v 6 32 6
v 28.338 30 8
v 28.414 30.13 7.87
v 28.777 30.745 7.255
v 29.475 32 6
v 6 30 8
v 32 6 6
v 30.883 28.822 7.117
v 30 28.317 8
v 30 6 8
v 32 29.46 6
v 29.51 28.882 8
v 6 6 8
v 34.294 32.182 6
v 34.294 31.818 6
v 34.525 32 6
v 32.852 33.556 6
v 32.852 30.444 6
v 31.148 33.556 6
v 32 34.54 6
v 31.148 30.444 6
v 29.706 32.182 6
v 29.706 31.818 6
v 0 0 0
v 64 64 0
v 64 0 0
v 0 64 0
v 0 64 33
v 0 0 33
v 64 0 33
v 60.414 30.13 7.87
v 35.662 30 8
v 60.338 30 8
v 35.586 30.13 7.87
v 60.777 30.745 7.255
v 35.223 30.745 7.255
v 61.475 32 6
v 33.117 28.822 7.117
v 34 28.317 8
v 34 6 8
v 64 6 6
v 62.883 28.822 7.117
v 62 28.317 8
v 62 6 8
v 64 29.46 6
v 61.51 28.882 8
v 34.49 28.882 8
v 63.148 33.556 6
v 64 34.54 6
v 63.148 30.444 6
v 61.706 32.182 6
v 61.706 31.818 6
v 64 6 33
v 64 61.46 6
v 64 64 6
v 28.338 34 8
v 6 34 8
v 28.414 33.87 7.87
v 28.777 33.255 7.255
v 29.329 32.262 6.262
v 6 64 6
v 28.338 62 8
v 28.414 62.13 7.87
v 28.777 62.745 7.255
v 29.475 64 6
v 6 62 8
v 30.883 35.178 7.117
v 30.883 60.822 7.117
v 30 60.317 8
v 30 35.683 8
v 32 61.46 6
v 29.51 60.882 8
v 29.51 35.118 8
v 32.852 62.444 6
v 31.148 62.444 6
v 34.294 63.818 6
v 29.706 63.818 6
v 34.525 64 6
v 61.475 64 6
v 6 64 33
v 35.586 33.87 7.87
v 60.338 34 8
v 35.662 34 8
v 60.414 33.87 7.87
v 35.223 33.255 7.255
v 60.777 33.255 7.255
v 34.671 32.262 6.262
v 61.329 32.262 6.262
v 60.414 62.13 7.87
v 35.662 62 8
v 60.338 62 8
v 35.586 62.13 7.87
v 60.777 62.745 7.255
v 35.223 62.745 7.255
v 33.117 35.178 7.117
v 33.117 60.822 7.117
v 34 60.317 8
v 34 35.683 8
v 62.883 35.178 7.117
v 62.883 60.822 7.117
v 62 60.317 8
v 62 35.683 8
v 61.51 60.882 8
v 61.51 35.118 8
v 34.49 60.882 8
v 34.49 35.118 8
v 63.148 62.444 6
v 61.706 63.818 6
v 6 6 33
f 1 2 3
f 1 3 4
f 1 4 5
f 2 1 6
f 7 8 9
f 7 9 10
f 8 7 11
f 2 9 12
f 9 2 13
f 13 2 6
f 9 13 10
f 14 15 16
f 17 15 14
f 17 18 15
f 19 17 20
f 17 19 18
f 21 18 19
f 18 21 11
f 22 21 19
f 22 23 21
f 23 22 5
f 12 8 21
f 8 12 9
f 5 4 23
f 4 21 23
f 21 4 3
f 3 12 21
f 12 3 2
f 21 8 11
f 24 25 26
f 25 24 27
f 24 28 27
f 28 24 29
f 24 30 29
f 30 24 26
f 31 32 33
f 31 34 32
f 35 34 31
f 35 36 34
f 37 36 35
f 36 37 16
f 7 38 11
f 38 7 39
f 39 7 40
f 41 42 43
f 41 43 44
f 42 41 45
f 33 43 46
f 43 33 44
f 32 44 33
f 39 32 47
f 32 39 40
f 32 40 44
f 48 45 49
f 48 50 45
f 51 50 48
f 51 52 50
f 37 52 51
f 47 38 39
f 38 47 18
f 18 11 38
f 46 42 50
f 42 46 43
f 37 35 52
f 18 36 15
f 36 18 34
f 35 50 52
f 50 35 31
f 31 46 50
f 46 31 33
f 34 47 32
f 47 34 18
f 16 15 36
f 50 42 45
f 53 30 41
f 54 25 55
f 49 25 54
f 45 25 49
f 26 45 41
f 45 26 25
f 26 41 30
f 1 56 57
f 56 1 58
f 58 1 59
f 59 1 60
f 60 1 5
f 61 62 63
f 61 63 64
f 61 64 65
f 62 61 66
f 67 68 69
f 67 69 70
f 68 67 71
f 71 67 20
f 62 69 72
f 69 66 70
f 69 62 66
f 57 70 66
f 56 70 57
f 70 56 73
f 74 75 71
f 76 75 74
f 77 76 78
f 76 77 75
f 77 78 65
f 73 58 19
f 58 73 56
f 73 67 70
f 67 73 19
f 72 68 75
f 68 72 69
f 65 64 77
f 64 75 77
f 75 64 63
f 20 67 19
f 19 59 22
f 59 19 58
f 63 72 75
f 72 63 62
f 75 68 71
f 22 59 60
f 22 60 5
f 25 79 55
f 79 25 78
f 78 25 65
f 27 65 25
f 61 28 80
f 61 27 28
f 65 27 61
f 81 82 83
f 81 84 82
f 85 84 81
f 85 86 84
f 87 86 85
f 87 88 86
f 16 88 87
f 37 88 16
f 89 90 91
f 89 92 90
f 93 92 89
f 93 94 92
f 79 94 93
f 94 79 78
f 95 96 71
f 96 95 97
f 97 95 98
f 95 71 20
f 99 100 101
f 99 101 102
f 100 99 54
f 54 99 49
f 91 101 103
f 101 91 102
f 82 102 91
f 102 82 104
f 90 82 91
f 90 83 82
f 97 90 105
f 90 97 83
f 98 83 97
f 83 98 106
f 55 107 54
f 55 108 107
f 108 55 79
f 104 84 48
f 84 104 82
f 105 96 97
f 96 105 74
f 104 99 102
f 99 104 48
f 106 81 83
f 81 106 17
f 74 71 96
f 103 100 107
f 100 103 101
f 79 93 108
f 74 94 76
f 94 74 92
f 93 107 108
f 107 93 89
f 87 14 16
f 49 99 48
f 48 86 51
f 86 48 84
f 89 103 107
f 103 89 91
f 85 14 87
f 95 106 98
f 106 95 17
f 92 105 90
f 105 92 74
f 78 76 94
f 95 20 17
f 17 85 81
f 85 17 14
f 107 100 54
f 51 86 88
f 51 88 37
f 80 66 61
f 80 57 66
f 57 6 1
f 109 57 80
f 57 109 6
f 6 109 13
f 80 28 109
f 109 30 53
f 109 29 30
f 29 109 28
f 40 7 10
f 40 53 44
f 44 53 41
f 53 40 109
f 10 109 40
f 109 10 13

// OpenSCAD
// file: WylochStyleDungeonLibrary.scad
size = 32;
baseheight = 6;
topperheight = 2;
walllength = size;
wallheight = 25 + baseheight + topperheight;
wallwidth = 6;
wallwidththin = 4;

function hypotenuse_ra(side_a, side_b) =
    sqrt(pow(side_a, 2) + pow(side_b, 2));

module wsdl_Base_1x1(s,bh,th) 
{
    union () {
        cube([s,s,bh]);
        translate([0,0,bh])
            intersection() {
                difference () {
                        cube([s,s,th]);
                        union () {
                        rotate(a=45, v=[1,0,0])
                            cube([s,th*2,th*2]);
                        translate([0,s,0])
                            rotate(a=45, v=[1,0,0])
                                cube([s,th*2,th*2]);
                        rotate(a=-45, v=[0,1,0])
                            cube([th*2,s,th*2]);
                        translate([s,0,0])
                            rotate(a=-45, v=[0,1,0])
                                cube([th*2,s,th*2]);
                        }
                }
                translate([s/2,s/2,0])
                    cylinder(
                        h=th, 
                        r1=hypotenuse_ra(s/2-1.2, s/2-1.2), 
                        r2=hypotenuse_ra(s/2-th-.8, s/2-th-.8), 
                        center=false, 
                        $fa=.1);
            }    
    }
}

module wsdl_Base_1x2(s,bh,th)
{
    union () {
        wsdl_Base_1x1(s,bh,th);
        translate([s,0,0])
            wsdl_Base_1x1(s,bh,th);
    }
}
 
module wsdl_Base_2x2(s,bh,th)
{
    union () {
        wsdl_Base_1x2(s,bh,th);
        translate([0,s,0])
            wsdl_Base_1x2(s,bh,th);
    }
}
 
module wsdl_Base_2x4(s,bh,th)
{
    union () {
        wsdl_Base_2x2(s,bh,th);
        translate([s*2,0,0])
            wsdl_Base_2x2(s,bh,th);
    }
}
 
module wsdl_Base_4x4(s,bh,th)
{
    union () {
        wsdl_Base_2x4(s,bh,th);
        translate([0,s*2,0])
            wsdl_Base_2x4(s,bh,th);
    }
}
 
module wsdl_Wall_1(w,l,h)
{
    cube([w,l,h]);   
}

module wsdl_Wall_2(w,l,h)
{
    union() {
        wsdl_Wall_1(w,l,h);
        translate([0,l,0])
            wsdl_Wall_1(w,l,h);
    }
}

module wsdl_Wall_1_Left(w,l,h) 
{
    wsdl_Wall_1(w,l,h);
}

module wsdl_Wall_1_Right(w,l,h) 
{
    translate([(size)-w,0,0])
        wsdl_Wall_1(w,l,h);
}

module wsdl_Wall_1_DoubleRight(w,l,h) 
{
    translate([(size*2)-w,0,0])
        wsdl_Wall_1(w,l,h);
}

module wsdl_Wall_1_Bottom(w,l,h) 
{
rotate(a=-90)
    translate([-w,0,0])
        wsdl_Wall_1(w,l,h);

}

module wsdl_Wall_1_Top(w,l,h) 
{
rotate(a=-90)
    translate([-l,0,0])
        wsdl_Wall_1(w,l,h);

}

module wsdl_Wall_1_Center(w,l,h) 
{
    translate([(size)-w/2,0,0])
        wsdl_Wall_1(w,l,h);
}


module wsdl_Wall_2_Left(w,l,h) 
{
    wsdl_Wall_2(w,l,h);
}

module wsdl_Wall_2_Right(w,l,h) 
{
    translate([(size*2)-w,0,0])
        wsdl_Wall_2(w,l,h);
}

module wsdl_Wall_2_Bottom(w,l,h) 
{
rotate(a=-90)
    translate([-w,0,0])
        wsdl_Wall_2(w,l,h);

}

module wsdl_Wall_2_Top(w,l,h) 
{
rotate(a=-90)
    translate([-l*2,0,0])
        wsdl_Wall_2(w,l,h);

}

module wsdl_Wall_2_Center(w,l,h) 
{
    translate([(size)-w/2,0,0])
        wsdl_Wall_2(w,l,h);
}
// main file
include <WylochStyleDungeonLibrary.scad>; 
 
wsdl_Base_2x2(size,baseheight,topperheight);
wsdl_Wall_2_Left(wallwidth,walllength,wallheight);
wsdl_Wall_2_Bottom(wallwidth,walllength,wallheight);
